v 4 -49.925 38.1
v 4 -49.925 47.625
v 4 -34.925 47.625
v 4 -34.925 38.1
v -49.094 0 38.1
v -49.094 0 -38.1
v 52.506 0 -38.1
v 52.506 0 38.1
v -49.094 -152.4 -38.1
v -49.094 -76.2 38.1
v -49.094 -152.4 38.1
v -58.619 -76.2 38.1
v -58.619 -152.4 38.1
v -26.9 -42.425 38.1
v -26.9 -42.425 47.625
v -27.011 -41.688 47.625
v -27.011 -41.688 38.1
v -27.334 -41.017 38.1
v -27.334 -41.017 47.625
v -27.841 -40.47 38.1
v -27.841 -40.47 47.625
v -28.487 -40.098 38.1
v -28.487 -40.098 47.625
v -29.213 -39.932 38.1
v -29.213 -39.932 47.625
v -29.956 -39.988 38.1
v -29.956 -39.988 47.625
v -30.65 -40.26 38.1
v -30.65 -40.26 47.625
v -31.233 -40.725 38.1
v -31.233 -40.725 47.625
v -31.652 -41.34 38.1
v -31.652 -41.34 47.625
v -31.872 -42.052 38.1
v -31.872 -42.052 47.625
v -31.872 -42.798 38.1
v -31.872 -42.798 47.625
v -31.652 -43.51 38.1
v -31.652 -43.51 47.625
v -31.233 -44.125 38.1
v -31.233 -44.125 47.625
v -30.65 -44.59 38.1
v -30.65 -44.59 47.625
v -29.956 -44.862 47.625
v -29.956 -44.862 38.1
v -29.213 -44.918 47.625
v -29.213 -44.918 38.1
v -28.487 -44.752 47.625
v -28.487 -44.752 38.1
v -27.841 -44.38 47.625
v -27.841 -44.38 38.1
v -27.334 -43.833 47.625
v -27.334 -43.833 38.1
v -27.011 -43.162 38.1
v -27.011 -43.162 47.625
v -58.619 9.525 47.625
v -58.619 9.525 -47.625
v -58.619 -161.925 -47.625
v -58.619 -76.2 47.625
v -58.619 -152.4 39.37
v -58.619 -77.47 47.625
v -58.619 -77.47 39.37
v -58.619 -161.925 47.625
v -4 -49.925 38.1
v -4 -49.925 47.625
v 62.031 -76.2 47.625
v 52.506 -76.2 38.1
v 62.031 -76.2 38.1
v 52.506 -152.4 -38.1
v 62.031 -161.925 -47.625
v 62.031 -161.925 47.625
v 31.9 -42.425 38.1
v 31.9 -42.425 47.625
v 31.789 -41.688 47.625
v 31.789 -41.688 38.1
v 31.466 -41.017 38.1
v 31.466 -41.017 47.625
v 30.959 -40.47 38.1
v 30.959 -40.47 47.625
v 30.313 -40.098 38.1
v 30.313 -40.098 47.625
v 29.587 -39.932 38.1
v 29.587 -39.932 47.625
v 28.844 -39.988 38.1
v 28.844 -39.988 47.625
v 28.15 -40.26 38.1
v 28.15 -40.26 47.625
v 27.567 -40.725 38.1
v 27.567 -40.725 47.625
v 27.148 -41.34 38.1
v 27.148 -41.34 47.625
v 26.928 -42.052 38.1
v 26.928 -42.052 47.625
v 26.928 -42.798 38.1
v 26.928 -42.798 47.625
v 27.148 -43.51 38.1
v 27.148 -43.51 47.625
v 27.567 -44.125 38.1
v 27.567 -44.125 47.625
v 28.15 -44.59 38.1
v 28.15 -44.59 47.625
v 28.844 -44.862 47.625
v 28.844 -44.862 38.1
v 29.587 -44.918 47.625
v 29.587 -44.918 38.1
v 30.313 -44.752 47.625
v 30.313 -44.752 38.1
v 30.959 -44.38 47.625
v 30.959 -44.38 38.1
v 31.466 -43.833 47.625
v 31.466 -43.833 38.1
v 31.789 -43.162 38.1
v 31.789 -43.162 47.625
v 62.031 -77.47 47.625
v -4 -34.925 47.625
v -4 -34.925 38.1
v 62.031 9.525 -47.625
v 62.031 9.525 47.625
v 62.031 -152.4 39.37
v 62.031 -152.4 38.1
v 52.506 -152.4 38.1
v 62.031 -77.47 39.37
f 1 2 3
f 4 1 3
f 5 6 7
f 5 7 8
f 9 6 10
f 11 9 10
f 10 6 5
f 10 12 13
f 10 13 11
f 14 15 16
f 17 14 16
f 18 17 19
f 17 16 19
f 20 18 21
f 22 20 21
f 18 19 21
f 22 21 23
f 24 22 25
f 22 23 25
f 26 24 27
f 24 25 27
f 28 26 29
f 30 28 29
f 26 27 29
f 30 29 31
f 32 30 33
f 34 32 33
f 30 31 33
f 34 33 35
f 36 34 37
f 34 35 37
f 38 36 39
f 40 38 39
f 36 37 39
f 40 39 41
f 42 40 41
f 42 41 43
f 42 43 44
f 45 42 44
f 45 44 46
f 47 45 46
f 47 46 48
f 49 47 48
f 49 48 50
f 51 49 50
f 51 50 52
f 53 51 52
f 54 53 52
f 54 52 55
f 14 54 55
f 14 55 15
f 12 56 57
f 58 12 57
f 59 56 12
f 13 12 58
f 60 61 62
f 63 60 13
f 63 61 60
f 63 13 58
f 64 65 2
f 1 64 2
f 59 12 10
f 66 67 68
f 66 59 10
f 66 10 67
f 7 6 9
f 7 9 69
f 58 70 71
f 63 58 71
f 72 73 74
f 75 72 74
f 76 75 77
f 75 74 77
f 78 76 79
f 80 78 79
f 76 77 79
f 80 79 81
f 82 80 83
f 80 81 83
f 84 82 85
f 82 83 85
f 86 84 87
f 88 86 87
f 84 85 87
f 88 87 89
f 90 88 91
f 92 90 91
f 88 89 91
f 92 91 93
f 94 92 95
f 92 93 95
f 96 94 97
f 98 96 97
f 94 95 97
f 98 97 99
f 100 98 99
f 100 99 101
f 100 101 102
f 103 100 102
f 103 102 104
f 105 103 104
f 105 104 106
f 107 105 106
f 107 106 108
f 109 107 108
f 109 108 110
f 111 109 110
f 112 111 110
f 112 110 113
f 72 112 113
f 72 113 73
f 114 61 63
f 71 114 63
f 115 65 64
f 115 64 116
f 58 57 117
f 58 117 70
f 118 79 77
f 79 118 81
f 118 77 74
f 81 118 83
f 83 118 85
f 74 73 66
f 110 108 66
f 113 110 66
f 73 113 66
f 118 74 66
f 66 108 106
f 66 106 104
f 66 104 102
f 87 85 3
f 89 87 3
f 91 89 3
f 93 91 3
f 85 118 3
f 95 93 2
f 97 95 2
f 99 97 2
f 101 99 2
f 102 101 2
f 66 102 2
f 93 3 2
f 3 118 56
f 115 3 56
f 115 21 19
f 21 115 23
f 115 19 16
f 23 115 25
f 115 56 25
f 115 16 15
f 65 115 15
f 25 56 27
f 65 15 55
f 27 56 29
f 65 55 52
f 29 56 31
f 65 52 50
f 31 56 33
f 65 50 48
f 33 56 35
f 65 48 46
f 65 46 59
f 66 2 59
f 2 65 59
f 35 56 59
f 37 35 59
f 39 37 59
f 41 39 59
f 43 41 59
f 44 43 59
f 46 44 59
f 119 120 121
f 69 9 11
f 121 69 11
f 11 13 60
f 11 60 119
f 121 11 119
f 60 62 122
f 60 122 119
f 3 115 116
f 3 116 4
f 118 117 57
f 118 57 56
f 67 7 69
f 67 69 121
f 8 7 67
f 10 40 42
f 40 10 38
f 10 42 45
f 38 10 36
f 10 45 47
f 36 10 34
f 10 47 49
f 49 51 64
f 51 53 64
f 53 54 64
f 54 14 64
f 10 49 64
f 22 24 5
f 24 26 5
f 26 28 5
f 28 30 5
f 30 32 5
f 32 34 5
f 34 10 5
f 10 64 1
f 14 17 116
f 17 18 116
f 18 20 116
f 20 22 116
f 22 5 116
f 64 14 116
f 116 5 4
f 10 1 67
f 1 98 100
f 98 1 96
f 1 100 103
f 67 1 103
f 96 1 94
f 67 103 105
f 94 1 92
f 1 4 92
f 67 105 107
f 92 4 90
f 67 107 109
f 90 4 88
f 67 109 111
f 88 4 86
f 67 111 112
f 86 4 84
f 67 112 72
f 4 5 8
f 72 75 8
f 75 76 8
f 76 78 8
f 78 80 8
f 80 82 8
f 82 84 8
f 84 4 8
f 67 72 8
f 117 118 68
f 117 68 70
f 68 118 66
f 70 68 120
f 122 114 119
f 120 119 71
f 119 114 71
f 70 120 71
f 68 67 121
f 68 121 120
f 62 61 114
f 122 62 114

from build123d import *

# Parameters (mm, degrees)
F0_W     = 120.65
F0_H     = 95.25
F0_W_2   = 101.6
F0_H_2   = 76.2
F1_DEPTH = 152.4
F2_W     = 9.525
F2_H     = 95.25
F3_DEPTH = 120.65
F4_W     = 120.65
F4_H     = 1.27
F5_DEPTH = 9.525
F6_W     = 8
F6_H     = 15
F6_R     = 2.5
F7_DEPTH = 25.4
F8_W     = 74.93
F8_H     = 1.27
F9_DEPTH = 179.07


with BuildPart() as f1:
    # F0 (on Front) → F1 (new body)
    with BuildSketch(Plane.XZ):
        with Locations((1.705641, 0)):
            Rectangle(F0_W, F0_H)
        with Locations((1.705641, 0)):
            Rectangle(F0_W_2, F0_H_2, mode=Mode.SUBTRACT)
    extrude(amount=F1_DEPTH)

    # F2 (on face) → F3 (join)
    with BuildSketch(Plane(origin=(-58.619359, 0, 0), x_dir=(0, -1, 0), z_dir=(-1, 0, 0))):
        with Locations((-4.7625, 0)):
            Rectangle(F2_W, F2_H)
        with Locations((157.1625, 0)):
            Rectangle(F2_W, F2_H)
    extrude(amount=-F3_DEPTH)

    # F4 (on face) → F5 (cut)
    with BuildSketch(Plane.XY.offset(47.625)):
        with Locations((1.705641, -76.835)):
            Rectangle(F4_W, F4_H)
    extrude(amount=-F5_DEPTH, mode=Mode.SUBTRACT)

    # F6 (on face) → F7 (cut)
    with BuildSketch(Plane.XY.offset(47.625)):
        with Locations((0, -42.425)):
            Rectangle(F6_W, F6_H)
        with Locations((-29.4, -42.425)):
            Circle(F6_R)
        with Locations((29.4, -42.425)):
            Circle(F6_R)
    extrude(amount=-F7_DEPTH, mode=Mode.SUBTRACT)

    # F8 (on face) → F9 (cut)
    with BuildSketch(Plane(origin=(-58.619359, 0, 0), x_dir=(0, -1, 0), z_dir=(-1, 0, 0))):
        with Locations((114.935, 38.735)):
            Rectangle(F8_W, F8_H)
    extrude(amount=-F9_DEPTH, mode=Mode.SUBTRACT)


solid = f1.part
